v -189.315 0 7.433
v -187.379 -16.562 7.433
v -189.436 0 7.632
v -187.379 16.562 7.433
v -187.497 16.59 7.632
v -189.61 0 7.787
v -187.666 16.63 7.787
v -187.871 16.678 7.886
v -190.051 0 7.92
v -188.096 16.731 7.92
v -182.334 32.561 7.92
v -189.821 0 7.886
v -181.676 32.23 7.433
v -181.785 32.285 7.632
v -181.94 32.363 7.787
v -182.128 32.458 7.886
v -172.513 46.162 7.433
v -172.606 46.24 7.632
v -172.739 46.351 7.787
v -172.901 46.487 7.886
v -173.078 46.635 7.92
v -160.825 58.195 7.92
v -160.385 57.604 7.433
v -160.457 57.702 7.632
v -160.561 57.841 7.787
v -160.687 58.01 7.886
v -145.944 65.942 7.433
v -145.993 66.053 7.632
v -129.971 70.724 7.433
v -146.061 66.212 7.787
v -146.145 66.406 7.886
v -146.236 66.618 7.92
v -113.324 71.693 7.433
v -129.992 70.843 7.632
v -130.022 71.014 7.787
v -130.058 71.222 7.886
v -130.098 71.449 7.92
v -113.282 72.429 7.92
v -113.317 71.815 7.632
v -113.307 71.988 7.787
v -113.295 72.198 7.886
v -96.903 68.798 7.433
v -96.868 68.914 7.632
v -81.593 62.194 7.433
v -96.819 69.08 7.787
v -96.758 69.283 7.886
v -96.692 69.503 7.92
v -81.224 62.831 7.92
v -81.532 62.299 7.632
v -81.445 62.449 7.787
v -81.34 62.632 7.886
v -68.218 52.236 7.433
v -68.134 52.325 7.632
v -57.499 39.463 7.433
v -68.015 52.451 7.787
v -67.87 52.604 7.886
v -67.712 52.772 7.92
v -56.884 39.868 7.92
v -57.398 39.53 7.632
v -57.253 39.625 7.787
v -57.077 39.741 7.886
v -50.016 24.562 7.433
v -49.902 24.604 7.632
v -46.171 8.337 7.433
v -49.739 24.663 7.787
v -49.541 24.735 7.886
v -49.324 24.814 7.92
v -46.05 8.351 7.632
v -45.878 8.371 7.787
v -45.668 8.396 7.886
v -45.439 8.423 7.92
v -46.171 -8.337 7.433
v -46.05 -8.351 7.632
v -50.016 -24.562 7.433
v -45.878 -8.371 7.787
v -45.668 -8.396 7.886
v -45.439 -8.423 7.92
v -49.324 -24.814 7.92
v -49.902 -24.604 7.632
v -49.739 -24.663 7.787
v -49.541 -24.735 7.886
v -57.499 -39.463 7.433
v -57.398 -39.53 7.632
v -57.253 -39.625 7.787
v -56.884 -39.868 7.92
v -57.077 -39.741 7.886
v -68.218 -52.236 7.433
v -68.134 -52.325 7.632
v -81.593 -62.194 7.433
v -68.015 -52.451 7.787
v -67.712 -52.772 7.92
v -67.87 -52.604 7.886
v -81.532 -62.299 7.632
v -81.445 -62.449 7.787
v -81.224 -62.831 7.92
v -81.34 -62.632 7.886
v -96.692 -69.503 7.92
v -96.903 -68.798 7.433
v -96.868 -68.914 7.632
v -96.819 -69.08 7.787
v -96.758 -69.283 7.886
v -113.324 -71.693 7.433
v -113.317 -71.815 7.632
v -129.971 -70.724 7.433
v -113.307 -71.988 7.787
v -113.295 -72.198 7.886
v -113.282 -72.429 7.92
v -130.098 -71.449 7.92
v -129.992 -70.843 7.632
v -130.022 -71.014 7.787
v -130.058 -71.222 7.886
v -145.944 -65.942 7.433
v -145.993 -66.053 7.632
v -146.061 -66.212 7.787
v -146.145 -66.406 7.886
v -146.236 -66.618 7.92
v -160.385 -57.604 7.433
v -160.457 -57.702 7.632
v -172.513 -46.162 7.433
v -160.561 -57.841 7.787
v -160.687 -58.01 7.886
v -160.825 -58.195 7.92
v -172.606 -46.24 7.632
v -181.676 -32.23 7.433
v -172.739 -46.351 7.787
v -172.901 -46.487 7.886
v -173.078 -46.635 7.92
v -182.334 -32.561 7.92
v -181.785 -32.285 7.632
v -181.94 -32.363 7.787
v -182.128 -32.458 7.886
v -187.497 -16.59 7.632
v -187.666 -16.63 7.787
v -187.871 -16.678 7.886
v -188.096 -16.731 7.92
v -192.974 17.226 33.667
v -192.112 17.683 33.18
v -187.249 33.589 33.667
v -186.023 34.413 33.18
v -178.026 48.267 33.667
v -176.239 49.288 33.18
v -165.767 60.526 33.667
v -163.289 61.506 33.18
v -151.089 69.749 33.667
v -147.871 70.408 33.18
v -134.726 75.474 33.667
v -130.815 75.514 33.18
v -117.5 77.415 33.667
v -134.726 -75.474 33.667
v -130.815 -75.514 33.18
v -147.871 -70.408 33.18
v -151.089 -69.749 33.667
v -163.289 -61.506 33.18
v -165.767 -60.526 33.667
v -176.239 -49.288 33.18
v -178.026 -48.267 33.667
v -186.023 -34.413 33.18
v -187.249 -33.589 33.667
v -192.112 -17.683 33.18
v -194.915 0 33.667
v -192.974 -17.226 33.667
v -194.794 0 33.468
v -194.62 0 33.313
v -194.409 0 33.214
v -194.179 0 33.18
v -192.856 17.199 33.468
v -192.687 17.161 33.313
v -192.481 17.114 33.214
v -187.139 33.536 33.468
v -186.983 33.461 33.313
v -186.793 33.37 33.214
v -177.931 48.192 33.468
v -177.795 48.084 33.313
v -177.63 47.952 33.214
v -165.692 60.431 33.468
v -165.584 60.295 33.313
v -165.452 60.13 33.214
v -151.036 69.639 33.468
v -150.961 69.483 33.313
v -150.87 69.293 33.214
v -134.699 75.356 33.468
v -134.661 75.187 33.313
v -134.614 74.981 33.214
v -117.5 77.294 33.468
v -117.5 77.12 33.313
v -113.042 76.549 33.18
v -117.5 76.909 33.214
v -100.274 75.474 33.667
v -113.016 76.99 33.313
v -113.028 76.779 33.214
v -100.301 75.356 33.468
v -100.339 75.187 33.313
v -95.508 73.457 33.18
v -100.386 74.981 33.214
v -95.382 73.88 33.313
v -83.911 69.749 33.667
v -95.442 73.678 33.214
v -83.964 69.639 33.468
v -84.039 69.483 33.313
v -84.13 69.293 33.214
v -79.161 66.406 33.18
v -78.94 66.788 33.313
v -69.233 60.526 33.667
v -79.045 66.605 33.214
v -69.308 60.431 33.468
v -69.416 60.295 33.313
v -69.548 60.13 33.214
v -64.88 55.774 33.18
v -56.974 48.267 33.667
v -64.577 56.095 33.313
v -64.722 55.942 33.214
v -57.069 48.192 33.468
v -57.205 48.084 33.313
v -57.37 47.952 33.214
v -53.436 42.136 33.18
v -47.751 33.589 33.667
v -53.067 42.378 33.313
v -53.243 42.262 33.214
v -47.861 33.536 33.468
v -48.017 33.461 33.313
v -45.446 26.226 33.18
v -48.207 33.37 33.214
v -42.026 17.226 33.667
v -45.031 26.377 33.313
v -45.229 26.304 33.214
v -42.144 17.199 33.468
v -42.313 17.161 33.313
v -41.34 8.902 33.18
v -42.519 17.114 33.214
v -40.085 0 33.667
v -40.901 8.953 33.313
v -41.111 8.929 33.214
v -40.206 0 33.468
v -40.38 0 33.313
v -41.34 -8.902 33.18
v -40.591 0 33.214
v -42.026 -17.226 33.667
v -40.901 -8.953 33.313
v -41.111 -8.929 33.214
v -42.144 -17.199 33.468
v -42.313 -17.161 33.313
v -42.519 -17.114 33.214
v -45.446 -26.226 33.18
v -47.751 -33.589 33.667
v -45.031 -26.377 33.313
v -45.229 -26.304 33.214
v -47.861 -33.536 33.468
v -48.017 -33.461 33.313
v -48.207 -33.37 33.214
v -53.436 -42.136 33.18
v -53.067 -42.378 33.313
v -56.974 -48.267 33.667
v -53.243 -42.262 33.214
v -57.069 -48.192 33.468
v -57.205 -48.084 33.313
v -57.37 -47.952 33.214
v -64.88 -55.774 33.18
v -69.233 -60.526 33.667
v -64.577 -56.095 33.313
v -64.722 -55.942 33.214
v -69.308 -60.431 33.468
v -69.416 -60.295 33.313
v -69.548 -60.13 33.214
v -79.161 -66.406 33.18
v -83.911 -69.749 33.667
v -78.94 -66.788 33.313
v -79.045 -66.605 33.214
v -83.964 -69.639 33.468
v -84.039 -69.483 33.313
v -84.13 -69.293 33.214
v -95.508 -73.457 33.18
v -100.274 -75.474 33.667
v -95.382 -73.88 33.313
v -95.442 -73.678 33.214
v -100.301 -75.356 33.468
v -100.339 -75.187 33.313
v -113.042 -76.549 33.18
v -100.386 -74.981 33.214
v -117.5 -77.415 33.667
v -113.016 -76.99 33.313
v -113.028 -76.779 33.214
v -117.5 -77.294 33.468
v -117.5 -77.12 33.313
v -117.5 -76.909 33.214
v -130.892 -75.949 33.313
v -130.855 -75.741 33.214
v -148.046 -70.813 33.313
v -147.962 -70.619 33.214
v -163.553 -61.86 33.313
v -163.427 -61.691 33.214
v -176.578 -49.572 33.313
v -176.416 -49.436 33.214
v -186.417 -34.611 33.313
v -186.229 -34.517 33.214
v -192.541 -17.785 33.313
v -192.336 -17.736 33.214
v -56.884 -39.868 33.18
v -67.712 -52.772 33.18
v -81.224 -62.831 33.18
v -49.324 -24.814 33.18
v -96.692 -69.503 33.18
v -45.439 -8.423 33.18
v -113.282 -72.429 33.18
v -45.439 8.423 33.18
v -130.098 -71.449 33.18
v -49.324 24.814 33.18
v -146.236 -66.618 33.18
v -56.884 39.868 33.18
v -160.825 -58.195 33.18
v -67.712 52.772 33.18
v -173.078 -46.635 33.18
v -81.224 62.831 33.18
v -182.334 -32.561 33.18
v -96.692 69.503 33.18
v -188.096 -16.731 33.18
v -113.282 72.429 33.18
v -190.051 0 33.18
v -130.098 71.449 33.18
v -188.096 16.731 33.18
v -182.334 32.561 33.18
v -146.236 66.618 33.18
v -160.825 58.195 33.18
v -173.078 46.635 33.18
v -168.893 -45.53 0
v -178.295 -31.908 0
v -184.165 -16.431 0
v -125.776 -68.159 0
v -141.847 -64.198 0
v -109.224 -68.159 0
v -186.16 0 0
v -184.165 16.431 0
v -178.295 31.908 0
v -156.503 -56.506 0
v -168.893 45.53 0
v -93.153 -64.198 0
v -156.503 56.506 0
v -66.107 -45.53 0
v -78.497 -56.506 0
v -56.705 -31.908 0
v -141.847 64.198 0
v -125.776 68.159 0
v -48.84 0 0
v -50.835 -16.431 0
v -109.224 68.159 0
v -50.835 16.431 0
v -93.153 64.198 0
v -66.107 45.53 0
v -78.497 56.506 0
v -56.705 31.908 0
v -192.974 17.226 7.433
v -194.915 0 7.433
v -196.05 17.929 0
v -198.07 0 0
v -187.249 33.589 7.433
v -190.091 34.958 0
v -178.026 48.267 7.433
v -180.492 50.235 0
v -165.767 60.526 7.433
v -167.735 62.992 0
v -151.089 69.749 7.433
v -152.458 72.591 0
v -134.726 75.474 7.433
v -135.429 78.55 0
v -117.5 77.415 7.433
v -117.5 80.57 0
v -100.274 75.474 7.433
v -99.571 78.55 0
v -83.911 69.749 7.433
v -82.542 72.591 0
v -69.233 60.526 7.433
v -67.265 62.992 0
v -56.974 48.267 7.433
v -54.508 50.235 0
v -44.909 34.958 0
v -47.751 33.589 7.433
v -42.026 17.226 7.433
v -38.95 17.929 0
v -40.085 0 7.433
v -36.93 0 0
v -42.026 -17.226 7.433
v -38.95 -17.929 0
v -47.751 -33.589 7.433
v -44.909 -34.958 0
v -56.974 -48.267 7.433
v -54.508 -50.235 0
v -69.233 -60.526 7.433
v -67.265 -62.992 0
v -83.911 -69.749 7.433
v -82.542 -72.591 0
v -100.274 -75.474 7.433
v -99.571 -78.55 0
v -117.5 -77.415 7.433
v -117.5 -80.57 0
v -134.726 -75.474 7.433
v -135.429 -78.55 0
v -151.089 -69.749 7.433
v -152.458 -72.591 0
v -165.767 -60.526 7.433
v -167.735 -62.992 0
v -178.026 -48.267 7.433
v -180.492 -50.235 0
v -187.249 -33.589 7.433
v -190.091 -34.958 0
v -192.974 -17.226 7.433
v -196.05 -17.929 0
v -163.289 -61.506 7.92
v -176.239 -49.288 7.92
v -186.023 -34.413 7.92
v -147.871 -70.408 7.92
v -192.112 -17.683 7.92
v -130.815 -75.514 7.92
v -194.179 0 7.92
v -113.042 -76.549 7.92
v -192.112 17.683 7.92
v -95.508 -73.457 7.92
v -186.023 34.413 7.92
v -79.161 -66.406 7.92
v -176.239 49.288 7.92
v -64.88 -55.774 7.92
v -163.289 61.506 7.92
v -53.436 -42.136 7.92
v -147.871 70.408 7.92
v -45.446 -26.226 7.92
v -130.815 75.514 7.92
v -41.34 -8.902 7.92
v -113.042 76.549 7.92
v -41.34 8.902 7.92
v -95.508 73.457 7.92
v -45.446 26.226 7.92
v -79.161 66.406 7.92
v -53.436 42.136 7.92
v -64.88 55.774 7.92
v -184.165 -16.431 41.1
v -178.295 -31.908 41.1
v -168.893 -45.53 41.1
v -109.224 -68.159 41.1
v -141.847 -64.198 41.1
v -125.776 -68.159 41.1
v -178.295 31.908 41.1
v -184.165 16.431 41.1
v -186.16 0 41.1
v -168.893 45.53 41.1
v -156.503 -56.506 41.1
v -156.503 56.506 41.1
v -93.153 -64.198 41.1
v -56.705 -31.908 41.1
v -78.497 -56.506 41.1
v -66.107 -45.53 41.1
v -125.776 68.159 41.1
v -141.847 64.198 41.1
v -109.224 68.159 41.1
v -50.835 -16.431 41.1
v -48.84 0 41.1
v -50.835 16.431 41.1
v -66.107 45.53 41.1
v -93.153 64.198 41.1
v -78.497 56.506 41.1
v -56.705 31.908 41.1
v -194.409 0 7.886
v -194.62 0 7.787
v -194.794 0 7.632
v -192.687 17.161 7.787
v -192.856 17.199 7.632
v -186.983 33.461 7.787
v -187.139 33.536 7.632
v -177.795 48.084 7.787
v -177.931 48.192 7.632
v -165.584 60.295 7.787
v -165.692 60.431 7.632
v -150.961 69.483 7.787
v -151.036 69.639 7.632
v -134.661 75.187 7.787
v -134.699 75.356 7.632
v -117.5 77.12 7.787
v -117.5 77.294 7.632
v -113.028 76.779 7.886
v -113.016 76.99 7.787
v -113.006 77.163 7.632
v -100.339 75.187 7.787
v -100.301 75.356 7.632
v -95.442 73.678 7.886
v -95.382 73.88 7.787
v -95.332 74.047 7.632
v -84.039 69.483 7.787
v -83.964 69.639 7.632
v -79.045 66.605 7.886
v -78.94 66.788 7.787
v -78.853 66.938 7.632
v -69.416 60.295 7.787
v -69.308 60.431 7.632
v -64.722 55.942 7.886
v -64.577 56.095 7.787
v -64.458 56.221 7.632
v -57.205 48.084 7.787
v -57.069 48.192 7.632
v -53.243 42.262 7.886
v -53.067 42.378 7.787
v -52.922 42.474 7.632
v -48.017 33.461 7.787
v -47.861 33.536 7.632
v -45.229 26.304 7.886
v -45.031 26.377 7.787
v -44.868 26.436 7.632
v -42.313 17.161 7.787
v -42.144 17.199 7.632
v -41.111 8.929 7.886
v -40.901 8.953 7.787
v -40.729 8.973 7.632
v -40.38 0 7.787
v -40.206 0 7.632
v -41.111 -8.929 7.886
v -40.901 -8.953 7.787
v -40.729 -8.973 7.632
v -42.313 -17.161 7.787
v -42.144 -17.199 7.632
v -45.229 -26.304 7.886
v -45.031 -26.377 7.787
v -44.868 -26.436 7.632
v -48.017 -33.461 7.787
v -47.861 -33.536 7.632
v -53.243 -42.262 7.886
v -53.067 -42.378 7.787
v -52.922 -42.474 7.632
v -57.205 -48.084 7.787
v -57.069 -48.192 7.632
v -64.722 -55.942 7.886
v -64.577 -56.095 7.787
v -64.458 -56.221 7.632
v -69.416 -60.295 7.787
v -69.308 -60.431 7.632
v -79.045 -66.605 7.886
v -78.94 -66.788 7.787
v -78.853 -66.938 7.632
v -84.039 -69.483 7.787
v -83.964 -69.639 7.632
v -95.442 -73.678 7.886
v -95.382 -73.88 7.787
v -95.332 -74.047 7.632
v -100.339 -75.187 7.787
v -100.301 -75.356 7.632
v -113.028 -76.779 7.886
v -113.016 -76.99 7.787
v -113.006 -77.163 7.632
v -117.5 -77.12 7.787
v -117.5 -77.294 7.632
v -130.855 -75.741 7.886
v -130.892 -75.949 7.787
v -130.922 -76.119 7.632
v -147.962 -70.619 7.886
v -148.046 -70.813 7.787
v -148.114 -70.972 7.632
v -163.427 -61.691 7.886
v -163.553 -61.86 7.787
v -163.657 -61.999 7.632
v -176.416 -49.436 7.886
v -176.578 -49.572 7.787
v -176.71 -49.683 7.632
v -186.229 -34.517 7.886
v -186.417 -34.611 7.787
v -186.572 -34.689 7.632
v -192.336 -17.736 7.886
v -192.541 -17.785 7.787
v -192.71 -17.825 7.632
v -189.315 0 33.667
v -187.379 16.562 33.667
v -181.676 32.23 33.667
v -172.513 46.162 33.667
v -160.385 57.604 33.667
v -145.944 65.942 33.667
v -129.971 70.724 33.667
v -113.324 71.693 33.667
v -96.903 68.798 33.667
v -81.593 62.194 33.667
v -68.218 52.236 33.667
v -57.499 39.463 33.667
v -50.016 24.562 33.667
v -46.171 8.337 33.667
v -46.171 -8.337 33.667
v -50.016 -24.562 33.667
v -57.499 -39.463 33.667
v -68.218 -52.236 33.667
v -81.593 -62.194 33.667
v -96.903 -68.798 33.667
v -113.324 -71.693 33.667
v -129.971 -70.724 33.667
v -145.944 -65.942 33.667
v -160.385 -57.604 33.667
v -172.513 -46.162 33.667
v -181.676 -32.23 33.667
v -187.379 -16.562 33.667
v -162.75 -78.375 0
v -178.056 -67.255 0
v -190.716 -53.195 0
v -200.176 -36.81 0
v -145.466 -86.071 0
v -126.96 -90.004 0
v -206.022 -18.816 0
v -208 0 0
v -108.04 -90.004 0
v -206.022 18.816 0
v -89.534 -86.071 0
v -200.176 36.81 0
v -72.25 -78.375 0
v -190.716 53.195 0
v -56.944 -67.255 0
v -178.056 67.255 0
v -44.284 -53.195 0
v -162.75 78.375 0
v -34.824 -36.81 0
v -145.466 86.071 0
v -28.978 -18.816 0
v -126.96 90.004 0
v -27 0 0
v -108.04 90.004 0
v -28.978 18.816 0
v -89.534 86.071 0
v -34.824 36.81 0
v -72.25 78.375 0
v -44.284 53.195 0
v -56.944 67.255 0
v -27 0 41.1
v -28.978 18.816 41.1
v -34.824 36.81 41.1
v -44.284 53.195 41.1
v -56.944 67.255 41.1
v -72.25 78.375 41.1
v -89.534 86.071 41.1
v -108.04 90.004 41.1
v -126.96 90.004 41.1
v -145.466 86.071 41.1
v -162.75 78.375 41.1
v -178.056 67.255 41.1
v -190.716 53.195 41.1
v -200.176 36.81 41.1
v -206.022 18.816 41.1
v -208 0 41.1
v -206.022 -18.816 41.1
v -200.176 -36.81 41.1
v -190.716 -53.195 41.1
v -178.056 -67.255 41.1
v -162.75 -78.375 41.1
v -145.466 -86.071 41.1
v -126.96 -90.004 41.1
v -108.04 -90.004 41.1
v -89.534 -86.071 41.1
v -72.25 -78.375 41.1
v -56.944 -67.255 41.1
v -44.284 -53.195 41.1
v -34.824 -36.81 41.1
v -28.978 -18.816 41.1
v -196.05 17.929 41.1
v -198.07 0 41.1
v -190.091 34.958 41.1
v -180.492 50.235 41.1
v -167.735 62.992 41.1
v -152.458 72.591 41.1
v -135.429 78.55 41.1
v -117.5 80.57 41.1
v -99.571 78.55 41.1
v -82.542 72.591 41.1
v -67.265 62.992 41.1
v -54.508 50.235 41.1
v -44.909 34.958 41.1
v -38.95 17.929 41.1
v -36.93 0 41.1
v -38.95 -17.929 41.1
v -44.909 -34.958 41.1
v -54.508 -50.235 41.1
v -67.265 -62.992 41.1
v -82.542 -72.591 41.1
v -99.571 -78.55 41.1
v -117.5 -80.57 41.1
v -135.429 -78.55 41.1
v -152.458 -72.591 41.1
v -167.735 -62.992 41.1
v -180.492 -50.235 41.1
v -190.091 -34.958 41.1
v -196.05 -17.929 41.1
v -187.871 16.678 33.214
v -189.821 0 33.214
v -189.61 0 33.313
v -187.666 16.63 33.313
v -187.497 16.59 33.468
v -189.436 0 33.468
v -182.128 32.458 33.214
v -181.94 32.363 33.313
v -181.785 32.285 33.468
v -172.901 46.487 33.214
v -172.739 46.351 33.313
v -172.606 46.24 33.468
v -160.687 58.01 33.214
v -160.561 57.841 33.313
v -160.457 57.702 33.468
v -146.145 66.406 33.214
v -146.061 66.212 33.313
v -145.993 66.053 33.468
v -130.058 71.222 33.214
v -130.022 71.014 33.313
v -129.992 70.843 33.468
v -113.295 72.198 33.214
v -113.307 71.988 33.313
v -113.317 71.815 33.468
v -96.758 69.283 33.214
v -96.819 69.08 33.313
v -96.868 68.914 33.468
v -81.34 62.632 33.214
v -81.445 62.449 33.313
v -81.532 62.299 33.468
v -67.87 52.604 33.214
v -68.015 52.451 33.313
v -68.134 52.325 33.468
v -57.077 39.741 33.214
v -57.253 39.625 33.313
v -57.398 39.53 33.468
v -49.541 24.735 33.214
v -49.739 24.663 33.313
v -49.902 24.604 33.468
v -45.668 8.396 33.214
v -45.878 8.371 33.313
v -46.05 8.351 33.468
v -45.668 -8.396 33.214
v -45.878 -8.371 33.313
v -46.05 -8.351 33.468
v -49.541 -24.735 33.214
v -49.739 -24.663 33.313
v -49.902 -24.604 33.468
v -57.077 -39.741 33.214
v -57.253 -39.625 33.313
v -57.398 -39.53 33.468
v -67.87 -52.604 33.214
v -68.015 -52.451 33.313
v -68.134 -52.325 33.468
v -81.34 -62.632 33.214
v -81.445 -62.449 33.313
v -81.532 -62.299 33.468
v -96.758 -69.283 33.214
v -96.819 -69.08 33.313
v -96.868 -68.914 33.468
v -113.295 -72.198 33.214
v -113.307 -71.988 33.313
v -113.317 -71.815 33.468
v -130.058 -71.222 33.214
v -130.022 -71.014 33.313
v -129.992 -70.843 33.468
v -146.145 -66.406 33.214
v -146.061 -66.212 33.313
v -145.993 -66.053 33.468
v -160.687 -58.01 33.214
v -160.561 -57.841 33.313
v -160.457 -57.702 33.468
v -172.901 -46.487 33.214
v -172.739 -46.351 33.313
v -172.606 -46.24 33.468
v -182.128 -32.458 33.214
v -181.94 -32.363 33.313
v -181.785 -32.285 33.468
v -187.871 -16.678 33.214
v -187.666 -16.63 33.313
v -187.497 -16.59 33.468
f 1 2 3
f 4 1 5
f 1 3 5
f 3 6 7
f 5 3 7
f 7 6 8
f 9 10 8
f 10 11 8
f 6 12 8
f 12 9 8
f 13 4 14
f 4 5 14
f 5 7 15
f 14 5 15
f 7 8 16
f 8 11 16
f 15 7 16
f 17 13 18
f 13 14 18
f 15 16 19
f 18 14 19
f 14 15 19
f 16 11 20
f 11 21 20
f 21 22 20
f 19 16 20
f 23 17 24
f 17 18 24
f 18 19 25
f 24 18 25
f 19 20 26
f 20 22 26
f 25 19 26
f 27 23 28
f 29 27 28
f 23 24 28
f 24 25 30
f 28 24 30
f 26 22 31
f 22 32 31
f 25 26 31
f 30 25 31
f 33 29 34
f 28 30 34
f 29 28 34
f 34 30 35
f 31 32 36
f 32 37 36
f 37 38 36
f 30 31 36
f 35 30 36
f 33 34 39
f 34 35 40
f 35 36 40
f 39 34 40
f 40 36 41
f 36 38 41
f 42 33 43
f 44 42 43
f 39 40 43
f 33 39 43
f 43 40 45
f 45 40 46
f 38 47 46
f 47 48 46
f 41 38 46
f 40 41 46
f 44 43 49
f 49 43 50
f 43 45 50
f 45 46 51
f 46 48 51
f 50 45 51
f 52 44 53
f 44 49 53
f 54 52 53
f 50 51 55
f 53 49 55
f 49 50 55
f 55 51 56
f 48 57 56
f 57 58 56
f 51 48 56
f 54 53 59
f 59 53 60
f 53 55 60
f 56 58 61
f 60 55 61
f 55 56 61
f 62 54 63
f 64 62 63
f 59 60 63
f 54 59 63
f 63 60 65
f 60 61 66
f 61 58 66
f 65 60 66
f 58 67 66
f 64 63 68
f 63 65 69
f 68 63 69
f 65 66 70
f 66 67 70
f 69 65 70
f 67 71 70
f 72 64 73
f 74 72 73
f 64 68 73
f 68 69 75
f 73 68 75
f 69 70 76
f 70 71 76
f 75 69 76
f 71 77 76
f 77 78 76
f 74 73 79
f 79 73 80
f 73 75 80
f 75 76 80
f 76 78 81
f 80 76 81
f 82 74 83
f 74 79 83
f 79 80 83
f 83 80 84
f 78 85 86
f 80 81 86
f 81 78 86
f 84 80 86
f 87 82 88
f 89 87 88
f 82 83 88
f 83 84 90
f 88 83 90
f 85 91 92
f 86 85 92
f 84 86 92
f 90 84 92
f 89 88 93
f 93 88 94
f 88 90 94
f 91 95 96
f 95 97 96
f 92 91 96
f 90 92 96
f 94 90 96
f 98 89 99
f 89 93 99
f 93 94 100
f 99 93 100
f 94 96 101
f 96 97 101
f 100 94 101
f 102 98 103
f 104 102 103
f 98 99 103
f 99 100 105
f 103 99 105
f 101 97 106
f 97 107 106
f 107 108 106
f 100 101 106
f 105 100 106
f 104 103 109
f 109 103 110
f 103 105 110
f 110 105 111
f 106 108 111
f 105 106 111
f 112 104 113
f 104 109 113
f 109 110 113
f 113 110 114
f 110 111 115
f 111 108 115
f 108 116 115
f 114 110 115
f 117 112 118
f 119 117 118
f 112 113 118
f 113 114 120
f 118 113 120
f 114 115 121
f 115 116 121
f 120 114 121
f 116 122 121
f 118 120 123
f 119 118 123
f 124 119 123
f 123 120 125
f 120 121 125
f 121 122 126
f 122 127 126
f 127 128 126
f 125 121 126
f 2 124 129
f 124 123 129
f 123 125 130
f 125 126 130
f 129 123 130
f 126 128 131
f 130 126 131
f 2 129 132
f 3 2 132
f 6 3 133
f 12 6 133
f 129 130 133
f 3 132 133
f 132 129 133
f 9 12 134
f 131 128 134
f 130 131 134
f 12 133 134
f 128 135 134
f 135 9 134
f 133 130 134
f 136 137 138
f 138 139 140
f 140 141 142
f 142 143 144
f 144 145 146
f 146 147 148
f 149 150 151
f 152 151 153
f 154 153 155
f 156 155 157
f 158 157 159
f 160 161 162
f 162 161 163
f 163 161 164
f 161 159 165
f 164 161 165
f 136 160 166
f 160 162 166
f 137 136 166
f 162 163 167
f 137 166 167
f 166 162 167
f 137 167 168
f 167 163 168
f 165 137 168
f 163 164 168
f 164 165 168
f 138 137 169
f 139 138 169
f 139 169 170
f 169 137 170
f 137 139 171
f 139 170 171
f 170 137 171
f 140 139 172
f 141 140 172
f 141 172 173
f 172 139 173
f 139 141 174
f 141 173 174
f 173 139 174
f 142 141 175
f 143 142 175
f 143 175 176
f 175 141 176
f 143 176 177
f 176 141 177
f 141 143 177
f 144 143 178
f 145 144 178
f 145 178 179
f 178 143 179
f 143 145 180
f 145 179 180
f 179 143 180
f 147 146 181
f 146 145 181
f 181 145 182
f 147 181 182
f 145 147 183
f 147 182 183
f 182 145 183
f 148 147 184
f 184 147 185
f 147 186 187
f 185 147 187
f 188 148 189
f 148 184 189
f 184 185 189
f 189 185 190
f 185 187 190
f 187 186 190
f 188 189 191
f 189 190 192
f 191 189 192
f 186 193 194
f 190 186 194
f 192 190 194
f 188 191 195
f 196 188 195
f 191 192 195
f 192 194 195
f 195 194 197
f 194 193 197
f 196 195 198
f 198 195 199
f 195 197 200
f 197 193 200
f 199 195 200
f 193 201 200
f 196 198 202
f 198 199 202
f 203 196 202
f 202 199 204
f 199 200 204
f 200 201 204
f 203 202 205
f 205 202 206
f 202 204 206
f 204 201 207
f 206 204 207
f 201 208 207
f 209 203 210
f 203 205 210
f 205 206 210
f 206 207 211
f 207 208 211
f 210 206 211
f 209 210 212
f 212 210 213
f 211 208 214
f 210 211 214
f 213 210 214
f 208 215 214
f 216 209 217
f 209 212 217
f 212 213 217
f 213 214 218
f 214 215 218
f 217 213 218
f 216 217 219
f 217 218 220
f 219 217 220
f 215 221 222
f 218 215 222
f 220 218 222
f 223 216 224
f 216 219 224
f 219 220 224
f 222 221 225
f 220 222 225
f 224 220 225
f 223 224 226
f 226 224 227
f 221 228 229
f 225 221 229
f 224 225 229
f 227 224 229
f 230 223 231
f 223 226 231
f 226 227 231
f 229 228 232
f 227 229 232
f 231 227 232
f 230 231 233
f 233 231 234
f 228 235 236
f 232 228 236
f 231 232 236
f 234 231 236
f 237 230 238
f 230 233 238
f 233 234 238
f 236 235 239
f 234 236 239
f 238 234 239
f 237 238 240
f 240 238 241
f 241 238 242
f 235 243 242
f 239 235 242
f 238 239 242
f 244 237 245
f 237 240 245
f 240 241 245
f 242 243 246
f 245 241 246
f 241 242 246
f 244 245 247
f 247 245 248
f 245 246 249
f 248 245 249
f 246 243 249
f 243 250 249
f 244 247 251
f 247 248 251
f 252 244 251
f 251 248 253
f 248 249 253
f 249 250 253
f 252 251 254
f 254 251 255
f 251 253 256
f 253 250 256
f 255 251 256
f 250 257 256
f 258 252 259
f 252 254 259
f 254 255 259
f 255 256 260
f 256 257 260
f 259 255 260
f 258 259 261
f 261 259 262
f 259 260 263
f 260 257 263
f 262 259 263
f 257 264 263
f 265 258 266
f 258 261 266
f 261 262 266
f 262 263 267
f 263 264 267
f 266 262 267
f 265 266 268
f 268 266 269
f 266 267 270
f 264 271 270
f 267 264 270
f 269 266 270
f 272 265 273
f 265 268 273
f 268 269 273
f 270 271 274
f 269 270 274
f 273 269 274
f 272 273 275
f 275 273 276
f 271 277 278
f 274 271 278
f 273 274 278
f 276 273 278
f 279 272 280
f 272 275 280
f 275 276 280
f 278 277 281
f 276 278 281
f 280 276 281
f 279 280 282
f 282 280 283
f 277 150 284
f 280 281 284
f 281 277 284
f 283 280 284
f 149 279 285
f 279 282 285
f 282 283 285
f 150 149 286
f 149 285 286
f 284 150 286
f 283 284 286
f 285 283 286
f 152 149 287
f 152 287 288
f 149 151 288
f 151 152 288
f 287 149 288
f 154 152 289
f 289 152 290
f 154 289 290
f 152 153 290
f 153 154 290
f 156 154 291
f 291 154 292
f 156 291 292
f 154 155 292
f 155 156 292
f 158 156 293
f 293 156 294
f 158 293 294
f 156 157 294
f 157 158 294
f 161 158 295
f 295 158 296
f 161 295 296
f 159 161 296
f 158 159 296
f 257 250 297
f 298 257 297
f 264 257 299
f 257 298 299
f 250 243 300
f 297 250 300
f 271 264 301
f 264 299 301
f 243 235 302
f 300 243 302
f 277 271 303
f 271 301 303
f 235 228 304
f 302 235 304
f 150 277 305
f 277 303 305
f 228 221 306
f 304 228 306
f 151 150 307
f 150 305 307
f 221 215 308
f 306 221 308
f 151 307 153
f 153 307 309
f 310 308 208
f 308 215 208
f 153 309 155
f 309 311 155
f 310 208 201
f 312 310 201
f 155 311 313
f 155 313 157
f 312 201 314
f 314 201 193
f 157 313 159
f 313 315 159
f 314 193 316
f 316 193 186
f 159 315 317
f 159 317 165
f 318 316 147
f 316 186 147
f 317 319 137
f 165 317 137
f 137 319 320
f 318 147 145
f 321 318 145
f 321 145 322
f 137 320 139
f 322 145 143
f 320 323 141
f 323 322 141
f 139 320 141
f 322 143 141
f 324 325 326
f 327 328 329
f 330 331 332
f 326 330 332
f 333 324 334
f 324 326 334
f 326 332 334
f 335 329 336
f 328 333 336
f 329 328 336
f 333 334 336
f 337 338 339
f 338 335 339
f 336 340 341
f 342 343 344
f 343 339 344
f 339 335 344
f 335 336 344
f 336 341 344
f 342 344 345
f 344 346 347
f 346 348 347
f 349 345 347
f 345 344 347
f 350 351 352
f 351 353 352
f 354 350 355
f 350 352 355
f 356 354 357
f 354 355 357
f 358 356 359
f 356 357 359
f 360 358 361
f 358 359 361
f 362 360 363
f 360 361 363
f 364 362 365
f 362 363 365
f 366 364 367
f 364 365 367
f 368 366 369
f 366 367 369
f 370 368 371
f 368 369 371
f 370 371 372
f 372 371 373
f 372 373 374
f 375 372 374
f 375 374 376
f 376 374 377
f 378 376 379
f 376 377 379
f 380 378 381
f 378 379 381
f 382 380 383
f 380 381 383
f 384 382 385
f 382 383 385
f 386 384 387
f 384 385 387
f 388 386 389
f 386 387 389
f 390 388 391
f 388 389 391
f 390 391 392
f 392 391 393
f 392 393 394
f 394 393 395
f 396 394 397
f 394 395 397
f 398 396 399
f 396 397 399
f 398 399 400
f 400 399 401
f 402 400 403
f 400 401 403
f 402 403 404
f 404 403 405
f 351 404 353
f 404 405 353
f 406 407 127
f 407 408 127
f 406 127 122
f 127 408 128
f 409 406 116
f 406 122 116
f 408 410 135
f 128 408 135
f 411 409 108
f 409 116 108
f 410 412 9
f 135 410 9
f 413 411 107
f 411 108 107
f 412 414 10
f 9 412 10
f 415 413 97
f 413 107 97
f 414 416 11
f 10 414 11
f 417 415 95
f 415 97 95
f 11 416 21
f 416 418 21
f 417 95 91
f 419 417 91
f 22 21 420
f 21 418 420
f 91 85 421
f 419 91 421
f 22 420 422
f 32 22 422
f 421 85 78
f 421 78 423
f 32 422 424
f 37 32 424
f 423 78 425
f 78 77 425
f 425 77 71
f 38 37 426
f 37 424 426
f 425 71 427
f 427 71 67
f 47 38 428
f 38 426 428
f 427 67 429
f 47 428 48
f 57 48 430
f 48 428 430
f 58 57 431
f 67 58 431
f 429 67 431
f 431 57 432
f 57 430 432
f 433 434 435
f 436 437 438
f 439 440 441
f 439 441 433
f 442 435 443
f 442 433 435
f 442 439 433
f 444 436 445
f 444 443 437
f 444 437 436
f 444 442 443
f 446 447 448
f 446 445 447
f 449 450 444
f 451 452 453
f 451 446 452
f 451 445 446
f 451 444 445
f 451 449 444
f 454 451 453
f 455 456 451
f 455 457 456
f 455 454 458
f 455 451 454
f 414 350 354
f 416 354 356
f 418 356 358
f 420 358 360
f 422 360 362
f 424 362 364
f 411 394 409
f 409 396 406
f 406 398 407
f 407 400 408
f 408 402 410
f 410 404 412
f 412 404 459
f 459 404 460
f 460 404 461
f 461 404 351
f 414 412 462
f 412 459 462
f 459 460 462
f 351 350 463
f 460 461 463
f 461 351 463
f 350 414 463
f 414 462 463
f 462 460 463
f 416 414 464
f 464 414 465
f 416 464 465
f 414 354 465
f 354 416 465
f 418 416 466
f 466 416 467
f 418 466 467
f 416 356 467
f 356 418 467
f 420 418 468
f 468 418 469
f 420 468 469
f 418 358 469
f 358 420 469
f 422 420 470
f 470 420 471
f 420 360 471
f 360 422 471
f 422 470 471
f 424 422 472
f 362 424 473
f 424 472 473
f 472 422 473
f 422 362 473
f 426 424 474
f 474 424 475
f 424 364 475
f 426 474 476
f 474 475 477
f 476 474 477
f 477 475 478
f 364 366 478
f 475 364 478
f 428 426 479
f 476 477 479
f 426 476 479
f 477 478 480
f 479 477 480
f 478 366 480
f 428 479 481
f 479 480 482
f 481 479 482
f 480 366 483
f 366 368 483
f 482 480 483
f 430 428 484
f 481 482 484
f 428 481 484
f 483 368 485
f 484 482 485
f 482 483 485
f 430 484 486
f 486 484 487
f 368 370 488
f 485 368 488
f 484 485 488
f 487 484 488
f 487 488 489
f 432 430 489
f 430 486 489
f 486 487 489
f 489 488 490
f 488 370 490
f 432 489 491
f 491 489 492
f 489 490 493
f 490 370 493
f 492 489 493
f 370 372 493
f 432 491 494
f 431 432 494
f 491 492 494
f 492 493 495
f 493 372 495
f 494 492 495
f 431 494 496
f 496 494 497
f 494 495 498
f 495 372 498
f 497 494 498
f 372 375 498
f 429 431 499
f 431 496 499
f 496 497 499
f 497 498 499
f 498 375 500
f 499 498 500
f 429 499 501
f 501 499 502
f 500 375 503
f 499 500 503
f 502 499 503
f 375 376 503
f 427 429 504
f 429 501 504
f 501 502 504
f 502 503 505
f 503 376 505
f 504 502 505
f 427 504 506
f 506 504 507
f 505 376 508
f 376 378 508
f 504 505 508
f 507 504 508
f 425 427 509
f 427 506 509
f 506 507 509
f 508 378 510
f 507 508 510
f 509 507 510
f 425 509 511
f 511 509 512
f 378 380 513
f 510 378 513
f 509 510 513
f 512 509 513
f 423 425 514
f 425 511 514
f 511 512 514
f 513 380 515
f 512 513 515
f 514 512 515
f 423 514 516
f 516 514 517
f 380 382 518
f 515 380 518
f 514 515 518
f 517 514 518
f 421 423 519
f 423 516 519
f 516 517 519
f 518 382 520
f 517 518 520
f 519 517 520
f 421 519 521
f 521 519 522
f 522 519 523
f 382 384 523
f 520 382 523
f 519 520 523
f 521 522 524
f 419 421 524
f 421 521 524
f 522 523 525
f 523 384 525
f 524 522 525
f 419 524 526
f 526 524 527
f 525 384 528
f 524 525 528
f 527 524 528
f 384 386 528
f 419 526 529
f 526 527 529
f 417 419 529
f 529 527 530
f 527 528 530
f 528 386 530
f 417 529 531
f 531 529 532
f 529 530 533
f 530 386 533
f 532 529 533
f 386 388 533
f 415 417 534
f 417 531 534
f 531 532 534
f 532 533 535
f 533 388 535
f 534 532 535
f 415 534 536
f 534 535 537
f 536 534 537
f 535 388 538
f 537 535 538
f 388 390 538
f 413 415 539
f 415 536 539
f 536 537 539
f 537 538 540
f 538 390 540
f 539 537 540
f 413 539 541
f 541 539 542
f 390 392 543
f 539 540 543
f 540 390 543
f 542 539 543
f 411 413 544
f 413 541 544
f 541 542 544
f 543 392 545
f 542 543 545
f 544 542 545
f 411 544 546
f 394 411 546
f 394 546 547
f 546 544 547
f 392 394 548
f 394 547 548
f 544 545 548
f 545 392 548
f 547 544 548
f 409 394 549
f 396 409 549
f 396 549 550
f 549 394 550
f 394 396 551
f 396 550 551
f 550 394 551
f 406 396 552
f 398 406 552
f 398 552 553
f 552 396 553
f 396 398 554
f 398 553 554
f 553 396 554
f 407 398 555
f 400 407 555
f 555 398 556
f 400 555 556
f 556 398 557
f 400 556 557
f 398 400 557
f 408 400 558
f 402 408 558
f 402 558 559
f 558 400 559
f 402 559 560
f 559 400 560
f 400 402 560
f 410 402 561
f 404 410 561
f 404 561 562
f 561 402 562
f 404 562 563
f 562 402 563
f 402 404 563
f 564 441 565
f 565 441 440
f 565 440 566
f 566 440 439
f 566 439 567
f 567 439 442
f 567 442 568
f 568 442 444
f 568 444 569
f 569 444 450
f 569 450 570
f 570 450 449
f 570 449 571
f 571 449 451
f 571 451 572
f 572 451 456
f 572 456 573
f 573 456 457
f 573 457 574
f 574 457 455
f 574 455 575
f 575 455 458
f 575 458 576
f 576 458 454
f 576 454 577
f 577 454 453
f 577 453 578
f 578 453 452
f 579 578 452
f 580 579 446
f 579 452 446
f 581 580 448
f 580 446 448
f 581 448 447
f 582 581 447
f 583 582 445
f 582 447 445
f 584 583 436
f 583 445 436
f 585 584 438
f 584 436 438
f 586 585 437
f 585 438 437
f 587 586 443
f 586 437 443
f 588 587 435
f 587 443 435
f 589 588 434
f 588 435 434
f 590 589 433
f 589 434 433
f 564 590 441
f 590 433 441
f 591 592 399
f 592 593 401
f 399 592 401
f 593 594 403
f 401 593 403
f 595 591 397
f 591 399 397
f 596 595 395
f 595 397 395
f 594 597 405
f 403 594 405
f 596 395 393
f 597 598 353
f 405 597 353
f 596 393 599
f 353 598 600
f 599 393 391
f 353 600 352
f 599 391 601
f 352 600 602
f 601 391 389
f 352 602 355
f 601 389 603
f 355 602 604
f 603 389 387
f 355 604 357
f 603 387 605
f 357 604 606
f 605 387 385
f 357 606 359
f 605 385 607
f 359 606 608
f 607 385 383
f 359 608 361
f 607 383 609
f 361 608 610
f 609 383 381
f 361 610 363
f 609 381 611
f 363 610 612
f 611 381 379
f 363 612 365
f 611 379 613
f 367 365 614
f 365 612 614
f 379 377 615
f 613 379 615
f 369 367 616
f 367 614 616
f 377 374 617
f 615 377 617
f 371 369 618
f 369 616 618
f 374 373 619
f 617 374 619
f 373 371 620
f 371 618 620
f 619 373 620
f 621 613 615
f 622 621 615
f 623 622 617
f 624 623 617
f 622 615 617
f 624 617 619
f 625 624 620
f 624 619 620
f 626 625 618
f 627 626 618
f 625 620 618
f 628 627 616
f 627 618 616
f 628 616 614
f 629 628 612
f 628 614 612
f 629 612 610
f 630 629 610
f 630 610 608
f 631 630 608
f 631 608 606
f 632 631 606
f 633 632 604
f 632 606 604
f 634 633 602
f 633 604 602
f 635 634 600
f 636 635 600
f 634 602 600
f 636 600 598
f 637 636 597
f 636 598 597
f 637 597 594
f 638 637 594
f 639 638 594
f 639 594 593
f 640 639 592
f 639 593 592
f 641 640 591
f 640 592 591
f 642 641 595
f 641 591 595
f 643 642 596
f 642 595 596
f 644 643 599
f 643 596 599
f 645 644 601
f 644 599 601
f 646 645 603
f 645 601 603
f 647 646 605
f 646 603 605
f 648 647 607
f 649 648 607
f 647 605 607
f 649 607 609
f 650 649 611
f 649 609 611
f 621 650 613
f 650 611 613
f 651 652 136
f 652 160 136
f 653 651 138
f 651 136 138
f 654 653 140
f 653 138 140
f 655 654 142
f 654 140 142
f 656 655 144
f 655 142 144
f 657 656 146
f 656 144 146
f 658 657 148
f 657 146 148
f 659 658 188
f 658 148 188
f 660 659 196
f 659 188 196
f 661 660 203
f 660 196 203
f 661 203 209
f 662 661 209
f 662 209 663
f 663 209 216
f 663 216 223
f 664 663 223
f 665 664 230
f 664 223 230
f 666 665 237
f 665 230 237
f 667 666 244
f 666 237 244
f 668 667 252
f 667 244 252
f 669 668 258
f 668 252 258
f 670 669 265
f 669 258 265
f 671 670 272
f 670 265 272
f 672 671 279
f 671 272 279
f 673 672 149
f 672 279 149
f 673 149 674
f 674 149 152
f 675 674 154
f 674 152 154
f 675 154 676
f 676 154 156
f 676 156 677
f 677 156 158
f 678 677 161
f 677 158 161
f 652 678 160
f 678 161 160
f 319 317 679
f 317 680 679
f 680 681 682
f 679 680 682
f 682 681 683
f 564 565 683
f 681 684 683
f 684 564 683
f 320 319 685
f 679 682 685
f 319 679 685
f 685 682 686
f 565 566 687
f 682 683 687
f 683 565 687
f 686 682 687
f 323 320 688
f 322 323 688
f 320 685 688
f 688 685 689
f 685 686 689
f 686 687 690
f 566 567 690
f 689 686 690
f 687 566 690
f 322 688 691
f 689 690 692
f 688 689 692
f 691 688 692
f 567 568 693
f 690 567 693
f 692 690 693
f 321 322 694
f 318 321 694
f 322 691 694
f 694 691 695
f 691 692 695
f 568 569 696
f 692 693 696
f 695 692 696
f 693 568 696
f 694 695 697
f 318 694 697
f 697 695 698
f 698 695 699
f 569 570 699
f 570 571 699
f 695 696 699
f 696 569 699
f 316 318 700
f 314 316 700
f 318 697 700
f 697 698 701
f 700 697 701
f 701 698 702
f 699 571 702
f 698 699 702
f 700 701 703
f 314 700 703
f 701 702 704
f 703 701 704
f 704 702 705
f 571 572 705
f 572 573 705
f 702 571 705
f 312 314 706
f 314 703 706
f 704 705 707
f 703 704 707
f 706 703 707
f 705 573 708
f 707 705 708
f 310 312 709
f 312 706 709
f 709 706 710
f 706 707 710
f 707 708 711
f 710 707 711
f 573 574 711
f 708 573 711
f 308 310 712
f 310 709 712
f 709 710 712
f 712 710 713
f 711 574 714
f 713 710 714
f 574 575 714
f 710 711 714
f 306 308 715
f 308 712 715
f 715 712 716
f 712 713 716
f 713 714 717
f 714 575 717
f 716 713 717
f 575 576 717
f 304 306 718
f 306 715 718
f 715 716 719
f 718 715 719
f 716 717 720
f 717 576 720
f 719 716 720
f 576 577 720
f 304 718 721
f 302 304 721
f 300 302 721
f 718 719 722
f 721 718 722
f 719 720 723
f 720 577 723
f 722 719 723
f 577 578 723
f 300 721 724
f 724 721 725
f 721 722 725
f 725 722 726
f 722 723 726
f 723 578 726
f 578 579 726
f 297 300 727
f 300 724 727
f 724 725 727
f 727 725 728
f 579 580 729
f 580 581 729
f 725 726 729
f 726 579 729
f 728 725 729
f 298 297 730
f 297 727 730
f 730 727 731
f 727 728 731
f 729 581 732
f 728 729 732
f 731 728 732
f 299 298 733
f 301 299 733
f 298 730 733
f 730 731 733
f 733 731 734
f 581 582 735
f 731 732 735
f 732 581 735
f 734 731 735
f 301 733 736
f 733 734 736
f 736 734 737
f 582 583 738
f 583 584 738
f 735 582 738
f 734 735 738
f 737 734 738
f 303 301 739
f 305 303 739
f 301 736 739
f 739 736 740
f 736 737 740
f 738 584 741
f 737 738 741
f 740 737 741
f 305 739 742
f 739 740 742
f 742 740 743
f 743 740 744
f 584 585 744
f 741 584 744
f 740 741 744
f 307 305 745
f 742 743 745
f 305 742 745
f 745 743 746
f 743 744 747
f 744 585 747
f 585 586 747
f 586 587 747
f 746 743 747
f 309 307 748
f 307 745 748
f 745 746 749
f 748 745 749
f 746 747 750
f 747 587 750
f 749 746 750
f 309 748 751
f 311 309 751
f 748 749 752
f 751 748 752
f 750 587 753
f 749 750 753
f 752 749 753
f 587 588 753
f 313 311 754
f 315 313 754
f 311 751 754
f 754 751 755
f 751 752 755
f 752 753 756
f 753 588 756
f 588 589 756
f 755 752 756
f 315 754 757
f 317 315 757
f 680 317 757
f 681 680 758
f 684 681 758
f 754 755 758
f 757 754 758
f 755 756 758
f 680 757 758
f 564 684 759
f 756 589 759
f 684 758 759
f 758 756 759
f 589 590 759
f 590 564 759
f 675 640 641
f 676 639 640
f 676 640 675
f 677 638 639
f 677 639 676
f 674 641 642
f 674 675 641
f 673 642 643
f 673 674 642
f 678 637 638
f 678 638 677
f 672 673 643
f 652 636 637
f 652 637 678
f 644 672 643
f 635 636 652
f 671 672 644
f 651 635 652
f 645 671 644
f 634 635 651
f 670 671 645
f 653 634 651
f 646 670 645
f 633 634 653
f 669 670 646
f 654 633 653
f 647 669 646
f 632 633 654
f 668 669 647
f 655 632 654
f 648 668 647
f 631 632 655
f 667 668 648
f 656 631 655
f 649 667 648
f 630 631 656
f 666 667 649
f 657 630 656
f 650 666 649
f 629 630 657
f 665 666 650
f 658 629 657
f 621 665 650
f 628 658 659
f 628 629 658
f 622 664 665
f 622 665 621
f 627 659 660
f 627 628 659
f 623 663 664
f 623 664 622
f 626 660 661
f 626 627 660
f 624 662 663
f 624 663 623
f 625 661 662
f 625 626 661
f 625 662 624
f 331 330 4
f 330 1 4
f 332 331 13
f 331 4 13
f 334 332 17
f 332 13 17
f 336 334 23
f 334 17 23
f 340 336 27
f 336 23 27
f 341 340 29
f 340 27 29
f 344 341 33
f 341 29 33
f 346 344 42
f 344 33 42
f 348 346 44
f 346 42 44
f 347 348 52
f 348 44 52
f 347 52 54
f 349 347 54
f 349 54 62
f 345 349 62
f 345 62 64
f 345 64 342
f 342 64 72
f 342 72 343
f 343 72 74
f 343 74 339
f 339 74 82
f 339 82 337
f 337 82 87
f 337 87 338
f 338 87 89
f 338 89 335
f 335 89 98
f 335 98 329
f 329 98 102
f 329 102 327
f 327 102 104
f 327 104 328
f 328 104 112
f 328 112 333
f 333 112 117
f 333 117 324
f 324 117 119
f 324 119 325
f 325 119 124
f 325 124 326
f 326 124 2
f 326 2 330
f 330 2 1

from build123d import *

# Parameters (mm, degrees)
F0_R     = 90.5
F1_DEPTH = 41.1


with BuildPart() as f1:
    # F0 (on Top) → F1 (new body)
    with BuildSketch(Plane.XY):
        with Locations((-117.5, 0)):
            Circle(F0_R)
    extrude(amount=F1_DEPTH)

    # F2 (on Front) → F3 (revolve, cut)
    with BuildSketch(Plane.XZ):
        with BuildLine():
            Line((-189.314945, 33.667415), (-186.16, 41.1))
            Line((-186.16, 41.1), (-198.07, 41.1))
            Line((-198.07, 41.1), (-194.915055, 33.667415))
            ThreePointArc((-194.915055, 33.667415), (-194.620201, 33.312891), (-194.178651, 33.18))
            Line((-194.178651, 33.18), (-190.051349, 33.18))
            ThreePointArc((-190.051349, 33.18), (-189.609799, 33.312891), (-189.314945, 33.667415))
        make_face()
        with BuildLine():
            ThreePointArc((-189.314945, 7.432585), (-189.609799, 7.787109), (-190.051349, 7.92))
            Line((-190.051349, 7.92), (-194.178651, 7.92))
            ThreePointArc((-194.178651, 7.92), (-194.620201, 7.787109), (-194.915055, 7.432585))
            Line((-194.915055, 7.432585), (-198.07, 0))
            Line((-198.07, 0), (-186.16, 0))
            Line((-186.16, 0), (-189.314945, 7.432585))
        make_face()
    revolve(axis=Axis((-117.5, 0, 20.55), (0, 0, -1)), mode=Mode.SUBTRACT)


solid = f1.part
